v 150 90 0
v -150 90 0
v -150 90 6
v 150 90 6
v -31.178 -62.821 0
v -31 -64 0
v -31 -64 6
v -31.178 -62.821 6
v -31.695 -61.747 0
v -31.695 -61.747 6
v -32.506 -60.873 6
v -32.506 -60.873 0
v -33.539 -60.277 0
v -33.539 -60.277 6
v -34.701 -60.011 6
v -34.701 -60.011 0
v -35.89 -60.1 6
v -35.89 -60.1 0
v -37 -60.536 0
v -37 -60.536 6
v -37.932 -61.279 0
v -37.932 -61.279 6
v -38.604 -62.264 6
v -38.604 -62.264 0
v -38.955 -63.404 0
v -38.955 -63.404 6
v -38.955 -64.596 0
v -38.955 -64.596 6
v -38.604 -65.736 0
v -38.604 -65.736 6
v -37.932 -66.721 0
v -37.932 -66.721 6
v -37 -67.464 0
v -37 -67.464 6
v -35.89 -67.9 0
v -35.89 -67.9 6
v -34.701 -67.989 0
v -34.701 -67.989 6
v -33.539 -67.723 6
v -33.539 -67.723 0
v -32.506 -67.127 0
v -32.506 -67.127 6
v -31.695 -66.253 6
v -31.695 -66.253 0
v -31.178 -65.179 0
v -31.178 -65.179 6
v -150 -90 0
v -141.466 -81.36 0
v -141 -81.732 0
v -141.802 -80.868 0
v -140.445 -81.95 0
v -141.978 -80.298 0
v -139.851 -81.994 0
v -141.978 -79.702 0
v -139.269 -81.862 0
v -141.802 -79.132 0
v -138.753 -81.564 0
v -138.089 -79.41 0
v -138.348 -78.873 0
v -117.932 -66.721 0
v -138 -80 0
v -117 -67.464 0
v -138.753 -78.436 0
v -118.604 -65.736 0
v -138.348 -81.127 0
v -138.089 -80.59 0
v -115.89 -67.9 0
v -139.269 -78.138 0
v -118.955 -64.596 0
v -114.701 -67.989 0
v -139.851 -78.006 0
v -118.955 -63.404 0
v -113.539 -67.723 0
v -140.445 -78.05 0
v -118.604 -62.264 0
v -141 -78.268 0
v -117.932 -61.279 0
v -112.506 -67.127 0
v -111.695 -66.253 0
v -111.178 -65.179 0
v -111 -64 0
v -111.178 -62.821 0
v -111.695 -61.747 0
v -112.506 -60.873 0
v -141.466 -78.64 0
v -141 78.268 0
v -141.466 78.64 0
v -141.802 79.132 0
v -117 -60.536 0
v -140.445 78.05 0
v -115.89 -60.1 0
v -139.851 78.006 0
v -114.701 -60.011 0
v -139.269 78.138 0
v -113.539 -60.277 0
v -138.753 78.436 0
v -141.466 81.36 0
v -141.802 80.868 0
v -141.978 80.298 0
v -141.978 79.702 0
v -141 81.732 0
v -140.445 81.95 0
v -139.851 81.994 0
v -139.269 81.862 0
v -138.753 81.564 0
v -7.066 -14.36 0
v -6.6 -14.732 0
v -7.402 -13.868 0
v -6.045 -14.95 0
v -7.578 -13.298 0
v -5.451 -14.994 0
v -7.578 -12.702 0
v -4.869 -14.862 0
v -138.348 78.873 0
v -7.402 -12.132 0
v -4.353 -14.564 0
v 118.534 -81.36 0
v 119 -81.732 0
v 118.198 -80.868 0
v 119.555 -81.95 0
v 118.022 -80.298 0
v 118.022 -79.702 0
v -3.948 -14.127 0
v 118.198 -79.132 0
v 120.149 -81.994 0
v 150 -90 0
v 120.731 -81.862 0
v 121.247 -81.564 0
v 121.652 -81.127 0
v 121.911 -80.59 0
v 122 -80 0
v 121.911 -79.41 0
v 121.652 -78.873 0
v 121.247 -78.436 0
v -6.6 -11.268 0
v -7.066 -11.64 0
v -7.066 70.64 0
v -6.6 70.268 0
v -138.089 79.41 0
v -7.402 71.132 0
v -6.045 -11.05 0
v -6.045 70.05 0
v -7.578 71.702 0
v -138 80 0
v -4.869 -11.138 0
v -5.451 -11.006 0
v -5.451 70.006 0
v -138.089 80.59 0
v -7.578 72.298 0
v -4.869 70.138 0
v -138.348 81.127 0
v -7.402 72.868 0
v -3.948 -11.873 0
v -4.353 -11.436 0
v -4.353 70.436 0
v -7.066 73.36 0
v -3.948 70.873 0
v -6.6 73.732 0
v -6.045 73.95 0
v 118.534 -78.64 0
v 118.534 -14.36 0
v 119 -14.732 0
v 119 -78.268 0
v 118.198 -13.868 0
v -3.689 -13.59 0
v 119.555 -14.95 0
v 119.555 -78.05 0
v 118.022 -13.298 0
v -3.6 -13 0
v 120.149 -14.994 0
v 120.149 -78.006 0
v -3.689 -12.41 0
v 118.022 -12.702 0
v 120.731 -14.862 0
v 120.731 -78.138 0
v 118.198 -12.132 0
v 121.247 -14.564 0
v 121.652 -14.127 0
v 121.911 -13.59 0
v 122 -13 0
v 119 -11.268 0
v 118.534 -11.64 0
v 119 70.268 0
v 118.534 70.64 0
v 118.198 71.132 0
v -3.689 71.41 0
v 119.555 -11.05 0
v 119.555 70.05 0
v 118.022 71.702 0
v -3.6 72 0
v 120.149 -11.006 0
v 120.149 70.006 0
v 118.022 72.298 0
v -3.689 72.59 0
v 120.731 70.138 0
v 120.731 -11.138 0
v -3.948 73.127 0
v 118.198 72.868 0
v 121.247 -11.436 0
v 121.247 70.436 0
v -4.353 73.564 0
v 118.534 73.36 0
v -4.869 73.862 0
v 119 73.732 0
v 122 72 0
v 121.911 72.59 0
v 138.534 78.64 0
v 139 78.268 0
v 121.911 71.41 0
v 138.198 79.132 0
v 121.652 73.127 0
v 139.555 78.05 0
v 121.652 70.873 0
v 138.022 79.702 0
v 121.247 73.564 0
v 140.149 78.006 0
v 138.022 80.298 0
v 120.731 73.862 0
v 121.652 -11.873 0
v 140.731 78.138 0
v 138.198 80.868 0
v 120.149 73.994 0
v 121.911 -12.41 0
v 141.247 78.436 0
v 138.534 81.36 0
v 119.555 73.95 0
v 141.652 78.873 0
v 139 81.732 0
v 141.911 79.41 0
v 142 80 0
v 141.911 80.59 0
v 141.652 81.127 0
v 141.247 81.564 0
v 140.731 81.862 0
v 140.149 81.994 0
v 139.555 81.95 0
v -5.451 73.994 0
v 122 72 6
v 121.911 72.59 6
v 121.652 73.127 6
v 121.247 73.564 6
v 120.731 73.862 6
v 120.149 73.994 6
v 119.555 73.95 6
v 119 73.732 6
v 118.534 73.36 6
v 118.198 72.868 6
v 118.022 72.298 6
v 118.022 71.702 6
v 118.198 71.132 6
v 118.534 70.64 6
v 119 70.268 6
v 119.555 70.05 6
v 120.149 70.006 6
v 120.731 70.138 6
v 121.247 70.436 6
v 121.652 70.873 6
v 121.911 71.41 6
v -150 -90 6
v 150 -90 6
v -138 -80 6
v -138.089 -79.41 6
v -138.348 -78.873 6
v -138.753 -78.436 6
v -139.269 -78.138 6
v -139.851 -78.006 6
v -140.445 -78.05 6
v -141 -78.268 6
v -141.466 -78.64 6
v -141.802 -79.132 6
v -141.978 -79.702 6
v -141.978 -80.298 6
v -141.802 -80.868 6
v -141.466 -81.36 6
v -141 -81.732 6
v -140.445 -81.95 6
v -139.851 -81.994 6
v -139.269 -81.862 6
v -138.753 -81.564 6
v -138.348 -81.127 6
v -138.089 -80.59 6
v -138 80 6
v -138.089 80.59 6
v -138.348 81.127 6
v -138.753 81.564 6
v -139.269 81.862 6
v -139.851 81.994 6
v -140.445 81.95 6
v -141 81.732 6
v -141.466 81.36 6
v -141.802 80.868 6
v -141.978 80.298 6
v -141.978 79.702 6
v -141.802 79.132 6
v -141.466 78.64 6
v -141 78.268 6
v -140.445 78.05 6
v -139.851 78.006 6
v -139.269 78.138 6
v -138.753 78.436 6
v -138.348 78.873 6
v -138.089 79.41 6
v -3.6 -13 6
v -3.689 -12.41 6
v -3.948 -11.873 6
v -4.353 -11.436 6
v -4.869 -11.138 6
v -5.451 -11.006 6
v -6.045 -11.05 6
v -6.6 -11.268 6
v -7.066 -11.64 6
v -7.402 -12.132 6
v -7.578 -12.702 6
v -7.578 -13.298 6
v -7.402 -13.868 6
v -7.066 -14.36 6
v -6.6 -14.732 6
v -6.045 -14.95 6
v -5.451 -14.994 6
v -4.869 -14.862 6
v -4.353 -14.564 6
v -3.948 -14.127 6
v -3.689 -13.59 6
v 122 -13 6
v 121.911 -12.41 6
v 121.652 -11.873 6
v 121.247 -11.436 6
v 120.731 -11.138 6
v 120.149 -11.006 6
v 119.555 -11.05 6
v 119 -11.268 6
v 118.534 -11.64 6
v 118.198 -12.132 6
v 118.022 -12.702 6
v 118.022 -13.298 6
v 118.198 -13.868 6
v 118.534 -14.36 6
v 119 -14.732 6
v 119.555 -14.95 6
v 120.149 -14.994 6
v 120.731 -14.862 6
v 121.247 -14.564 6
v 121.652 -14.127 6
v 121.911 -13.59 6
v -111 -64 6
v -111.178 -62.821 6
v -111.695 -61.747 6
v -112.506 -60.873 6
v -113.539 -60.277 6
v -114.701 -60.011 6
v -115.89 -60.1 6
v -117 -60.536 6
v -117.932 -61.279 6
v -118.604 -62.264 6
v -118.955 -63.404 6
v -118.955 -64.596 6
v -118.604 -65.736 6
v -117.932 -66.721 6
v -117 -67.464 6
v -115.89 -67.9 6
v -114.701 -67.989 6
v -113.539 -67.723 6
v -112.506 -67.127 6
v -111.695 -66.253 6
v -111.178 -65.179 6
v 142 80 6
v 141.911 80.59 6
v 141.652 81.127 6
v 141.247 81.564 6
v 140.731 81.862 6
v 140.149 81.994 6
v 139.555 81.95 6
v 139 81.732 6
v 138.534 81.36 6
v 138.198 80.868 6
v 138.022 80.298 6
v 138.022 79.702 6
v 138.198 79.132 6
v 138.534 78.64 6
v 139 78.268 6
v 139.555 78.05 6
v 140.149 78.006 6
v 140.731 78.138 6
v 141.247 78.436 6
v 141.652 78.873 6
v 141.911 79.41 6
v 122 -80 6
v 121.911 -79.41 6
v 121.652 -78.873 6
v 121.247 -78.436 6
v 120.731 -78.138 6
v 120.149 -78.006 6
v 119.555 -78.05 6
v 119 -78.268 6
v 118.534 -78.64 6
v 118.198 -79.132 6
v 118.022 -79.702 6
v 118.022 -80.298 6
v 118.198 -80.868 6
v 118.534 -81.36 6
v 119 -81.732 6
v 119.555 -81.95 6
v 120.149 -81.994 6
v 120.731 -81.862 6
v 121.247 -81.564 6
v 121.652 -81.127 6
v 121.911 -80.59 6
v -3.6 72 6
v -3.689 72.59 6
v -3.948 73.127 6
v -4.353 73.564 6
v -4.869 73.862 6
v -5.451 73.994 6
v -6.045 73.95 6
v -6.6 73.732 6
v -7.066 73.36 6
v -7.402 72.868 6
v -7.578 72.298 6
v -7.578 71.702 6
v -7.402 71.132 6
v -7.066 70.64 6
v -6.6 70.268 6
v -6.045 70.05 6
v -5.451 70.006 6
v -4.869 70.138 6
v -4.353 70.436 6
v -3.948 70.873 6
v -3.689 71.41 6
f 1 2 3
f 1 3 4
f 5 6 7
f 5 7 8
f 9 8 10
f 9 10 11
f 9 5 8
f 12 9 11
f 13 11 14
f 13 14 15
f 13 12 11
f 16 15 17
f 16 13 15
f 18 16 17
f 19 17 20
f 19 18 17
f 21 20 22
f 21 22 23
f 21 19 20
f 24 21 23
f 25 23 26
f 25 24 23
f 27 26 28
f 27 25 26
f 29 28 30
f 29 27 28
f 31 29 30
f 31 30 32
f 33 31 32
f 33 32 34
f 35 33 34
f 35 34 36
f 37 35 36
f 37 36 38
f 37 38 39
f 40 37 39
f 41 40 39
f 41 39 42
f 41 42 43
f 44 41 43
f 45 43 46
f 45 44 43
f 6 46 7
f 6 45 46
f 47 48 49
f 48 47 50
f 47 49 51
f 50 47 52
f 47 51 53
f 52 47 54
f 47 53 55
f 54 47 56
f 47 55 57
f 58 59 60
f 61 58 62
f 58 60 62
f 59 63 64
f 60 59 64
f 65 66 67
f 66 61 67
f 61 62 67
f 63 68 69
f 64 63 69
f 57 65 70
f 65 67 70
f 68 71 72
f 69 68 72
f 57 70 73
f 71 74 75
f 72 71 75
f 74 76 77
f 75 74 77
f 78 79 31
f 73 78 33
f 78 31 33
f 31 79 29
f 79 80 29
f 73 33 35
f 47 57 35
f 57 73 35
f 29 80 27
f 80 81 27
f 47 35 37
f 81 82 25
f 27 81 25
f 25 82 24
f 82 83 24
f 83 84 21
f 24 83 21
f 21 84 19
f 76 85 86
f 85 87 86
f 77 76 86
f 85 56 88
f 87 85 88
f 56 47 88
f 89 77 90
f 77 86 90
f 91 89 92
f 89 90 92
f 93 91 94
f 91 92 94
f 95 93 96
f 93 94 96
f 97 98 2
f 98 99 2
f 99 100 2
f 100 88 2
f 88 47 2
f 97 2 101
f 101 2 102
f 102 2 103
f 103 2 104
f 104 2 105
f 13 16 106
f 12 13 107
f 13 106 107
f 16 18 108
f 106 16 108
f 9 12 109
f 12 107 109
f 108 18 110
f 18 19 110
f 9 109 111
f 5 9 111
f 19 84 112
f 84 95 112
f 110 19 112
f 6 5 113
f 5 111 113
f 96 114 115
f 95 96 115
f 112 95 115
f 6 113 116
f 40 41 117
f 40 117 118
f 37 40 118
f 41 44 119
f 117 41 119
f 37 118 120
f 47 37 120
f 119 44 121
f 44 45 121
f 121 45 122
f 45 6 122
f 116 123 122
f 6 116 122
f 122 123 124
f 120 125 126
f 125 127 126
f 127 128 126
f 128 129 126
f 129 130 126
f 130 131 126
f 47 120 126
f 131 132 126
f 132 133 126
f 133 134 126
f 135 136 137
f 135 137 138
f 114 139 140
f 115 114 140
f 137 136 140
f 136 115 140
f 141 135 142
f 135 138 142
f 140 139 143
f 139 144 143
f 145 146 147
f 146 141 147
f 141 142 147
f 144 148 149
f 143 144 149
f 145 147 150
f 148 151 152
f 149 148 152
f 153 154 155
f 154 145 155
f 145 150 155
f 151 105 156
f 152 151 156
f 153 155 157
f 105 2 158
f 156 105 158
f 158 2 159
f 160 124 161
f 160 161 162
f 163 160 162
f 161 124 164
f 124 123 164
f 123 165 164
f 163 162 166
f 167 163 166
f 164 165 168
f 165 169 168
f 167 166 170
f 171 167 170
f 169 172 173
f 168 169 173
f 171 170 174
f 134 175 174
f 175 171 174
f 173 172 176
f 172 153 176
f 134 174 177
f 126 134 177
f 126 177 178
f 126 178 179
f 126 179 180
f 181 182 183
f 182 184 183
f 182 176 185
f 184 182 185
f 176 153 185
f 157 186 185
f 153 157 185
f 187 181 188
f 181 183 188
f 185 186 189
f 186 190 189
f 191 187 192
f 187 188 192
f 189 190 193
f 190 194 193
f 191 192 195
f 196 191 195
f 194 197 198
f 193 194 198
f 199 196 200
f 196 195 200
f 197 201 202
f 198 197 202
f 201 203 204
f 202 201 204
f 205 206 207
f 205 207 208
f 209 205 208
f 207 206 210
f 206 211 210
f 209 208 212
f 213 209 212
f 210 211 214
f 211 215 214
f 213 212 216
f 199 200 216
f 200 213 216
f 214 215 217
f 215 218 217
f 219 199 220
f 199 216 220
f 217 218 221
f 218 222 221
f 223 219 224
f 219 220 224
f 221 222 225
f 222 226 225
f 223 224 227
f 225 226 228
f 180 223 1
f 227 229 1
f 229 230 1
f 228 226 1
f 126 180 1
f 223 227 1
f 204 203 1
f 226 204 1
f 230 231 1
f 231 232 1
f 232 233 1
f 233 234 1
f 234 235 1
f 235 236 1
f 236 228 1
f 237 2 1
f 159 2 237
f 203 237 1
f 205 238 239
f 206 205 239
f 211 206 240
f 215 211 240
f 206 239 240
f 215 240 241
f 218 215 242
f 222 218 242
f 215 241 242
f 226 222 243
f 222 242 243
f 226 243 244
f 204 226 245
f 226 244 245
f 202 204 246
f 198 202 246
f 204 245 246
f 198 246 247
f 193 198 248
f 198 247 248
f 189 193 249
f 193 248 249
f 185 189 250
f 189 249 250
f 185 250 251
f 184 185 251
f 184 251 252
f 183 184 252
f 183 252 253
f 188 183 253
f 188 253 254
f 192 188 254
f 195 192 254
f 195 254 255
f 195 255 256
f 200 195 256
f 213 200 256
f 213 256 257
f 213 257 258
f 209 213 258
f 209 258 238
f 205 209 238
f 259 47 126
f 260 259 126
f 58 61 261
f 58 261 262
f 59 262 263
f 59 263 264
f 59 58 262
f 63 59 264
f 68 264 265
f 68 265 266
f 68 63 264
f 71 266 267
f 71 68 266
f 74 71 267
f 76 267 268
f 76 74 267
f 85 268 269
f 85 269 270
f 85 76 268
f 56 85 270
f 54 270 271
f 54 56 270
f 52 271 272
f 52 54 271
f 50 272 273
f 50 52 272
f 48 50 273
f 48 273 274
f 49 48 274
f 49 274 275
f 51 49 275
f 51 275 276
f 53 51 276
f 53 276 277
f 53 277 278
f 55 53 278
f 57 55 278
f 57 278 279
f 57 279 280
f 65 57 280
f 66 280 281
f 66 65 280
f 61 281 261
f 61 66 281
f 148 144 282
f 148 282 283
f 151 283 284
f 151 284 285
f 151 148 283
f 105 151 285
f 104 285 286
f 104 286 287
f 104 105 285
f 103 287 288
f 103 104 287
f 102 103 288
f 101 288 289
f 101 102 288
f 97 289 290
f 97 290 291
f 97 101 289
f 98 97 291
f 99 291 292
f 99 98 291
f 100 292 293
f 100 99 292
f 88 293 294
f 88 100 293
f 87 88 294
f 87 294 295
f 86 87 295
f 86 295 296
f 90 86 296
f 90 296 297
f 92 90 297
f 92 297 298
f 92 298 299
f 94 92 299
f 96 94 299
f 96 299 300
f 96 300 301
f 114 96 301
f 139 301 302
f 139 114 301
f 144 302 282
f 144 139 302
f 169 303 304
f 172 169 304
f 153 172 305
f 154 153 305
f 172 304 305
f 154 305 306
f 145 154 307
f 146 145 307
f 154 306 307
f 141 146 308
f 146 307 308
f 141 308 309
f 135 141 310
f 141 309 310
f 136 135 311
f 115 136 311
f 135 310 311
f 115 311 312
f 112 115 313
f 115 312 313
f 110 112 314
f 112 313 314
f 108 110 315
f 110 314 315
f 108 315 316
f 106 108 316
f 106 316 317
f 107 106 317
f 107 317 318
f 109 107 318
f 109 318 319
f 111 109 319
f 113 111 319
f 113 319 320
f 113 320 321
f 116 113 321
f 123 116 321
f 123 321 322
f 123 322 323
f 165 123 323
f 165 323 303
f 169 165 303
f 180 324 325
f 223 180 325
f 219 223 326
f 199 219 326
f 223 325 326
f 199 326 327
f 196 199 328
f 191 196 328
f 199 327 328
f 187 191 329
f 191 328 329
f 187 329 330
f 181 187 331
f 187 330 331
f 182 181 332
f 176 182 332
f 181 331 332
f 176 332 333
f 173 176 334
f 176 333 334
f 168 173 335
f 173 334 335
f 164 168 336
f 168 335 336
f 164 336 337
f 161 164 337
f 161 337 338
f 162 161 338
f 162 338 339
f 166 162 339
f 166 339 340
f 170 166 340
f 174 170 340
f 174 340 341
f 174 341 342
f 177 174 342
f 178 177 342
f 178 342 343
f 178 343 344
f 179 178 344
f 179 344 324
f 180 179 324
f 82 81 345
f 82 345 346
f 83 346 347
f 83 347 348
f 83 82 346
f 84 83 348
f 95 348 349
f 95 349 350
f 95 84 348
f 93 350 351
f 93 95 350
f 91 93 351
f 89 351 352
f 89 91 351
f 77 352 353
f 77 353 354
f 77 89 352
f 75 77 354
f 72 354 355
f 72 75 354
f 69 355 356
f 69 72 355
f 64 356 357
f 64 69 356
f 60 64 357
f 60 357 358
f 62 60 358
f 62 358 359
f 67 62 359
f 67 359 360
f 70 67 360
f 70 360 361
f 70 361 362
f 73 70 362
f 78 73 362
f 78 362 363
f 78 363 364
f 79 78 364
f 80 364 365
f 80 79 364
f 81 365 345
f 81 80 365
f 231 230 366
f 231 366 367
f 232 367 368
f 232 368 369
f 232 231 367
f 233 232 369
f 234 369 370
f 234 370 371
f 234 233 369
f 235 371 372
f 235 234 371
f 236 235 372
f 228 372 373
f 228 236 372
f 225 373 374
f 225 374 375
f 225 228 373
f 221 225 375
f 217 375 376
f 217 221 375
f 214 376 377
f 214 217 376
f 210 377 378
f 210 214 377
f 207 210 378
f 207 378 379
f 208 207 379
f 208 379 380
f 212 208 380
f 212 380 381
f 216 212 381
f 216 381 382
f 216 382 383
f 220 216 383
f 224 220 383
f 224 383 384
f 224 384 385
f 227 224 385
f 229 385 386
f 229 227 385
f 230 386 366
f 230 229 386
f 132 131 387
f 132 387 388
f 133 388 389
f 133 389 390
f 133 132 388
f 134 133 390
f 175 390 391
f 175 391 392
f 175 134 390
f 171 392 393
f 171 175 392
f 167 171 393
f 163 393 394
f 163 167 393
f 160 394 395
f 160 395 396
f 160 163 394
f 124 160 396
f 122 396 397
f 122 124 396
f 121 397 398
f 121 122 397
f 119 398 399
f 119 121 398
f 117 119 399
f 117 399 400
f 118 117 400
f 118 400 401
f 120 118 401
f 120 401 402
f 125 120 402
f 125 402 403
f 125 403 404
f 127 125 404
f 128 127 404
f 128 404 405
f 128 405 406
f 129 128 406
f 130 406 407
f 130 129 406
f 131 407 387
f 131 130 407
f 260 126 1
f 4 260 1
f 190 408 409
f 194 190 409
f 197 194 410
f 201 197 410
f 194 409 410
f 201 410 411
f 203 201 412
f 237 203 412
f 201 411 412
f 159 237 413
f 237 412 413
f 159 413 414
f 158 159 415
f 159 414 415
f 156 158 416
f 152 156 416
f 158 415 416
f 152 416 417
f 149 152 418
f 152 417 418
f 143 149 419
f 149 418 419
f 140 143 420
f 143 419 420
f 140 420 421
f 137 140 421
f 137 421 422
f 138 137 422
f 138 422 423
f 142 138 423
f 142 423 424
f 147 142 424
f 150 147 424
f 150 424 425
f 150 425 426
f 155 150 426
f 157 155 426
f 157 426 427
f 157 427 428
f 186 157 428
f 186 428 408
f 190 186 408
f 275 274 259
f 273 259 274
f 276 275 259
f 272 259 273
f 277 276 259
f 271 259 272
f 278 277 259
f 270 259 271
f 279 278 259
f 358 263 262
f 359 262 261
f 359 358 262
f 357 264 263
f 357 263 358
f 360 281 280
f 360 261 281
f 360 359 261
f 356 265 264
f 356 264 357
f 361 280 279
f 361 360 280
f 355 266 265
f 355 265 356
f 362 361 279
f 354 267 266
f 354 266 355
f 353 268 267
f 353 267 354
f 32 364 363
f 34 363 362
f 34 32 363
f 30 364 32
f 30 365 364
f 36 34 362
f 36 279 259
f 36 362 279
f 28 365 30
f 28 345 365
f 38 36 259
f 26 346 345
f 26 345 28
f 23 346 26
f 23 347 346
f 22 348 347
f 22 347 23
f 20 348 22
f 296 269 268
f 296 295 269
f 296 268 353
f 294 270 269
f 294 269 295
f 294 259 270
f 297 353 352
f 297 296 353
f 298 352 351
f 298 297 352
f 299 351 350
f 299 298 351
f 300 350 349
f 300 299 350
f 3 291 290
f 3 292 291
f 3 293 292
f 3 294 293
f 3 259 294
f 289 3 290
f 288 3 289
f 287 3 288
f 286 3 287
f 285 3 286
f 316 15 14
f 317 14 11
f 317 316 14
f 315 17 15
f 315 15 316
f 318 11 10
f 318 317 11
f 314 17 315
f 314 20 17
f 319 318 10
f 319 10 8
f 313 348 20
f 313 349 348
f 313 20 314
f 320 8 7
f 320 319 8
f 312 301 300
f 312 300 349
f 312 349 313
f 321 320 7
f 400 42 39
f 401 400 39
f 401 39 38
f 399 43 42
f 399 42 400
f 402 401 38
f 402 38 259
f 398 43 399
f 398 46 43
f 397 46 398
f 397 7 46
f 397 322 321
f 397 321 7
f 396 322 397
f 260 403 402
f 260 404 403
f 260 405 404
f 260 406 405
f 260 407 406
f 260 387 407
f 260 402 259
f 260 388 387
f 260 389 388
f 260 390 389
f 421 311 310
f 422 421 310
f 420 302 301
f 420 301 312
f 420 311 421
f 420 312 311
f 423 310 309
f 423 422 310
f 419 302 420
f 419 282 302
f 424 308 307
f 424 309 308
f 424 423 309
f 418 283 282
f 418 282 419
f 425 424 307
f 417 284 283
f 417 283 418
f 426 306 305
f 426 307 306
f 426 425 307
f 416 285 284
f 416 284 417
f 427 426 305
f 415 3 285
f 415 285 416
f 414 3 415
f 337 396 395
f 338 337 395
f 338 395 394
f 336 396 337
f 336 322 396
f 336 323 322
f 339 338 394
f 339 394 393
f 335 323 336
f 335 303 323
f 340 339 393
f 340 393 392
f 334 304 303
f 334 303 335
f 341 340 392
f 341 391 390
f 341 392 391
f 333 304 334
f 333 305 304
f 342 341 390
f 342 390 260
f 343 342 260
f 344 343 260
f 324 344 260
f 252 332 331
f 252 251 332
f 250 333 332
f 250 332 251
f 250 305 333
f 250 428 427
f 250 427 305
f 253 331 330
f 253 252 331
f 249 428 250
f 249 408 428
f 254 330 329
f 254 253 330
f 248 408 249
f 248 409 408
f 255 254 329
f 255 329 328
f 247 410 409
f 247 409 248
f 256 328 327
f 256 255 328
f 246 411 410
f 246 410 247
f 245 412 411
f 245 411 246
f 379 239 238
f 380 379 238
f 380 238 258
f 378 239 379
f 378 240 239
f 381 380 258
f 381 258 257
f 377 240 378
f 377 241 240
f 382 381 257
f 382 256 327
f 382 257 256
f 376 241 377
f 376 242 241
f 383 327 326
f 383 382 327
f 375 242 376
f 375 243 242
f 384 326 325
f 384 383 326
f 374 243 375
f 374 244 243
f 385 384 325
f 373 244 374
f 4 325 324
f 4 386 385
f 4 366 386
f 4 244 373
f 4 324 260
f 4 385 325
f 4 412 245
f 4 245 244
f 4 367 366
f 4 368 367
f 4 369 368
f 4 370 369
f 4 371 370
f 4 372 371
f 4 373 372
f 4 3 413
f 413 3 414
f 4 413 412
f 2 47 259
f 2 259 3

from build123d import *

# Parameters (mm, degrees)
ESBO_O1_W                = 300
ESBO_O1_H                = 180
ESBO_O1_R                = 2
ESBO_O1_R_2              = 4
RESSALTO_EXTRUS_O1_DEPTH = 6
ESBO_O2_R                = 2
CORTE_EXTRUS_O1_DEPTH    = 10


with BuildPart() as part:
    # Esboço1 → Ressalto-extrusão1 (new body)
    with BuildSketch(Plane.XY):
        Rectangle(ESBO_O1_W, ESBO_O1_H)
        with Locations((120, -80)):
            Circle(ESBO_O1_R, mode=Mode.SUBTRACT)
        with Locations((140, 80)):
            Circle(ESBO_O1_R, mode=Mode.SUBTRACT)
        with Locations((-140, 80)):
            Circle(ESBO_O1_R, mode=Mode.SUBTRACT)
        with Locations((-140, -80)):
            Circle(ESBO_O1_R, mode=Mode.SUBTRACT)
        with Locations((-115, -64)):
            Circle(ESBO_O1_R_2, mode=Mode.SUBTRACT)
        with Locations((-35, -64)):
            Circle(ESBO_O1_R_2, mode=Mode.SUBTRACT)
    extrude(amount=RESSALTO_EXTRUS_O1_DEPTH)

    # Esboço2 → Corte-extrusão1 (cut)
    with BuildSketch(Plane.XY.offset(6)):
        with Locations((120, 72)):
            Circle(ESBO_O2_R)
        with Locations((-5.6, 72)):
            Circle(ESBO_O2_R)
        with Locations((-5.6, -13)):
            Circle(ESBO_O2_R)
        with Locations((120, -13)):
            Circle(ESBO_O2_R)
    extrude(amount=-CORTE_EXTRUS_O1_DEPTH, mode=Mode.SUBTRACT)


solid = part.part
